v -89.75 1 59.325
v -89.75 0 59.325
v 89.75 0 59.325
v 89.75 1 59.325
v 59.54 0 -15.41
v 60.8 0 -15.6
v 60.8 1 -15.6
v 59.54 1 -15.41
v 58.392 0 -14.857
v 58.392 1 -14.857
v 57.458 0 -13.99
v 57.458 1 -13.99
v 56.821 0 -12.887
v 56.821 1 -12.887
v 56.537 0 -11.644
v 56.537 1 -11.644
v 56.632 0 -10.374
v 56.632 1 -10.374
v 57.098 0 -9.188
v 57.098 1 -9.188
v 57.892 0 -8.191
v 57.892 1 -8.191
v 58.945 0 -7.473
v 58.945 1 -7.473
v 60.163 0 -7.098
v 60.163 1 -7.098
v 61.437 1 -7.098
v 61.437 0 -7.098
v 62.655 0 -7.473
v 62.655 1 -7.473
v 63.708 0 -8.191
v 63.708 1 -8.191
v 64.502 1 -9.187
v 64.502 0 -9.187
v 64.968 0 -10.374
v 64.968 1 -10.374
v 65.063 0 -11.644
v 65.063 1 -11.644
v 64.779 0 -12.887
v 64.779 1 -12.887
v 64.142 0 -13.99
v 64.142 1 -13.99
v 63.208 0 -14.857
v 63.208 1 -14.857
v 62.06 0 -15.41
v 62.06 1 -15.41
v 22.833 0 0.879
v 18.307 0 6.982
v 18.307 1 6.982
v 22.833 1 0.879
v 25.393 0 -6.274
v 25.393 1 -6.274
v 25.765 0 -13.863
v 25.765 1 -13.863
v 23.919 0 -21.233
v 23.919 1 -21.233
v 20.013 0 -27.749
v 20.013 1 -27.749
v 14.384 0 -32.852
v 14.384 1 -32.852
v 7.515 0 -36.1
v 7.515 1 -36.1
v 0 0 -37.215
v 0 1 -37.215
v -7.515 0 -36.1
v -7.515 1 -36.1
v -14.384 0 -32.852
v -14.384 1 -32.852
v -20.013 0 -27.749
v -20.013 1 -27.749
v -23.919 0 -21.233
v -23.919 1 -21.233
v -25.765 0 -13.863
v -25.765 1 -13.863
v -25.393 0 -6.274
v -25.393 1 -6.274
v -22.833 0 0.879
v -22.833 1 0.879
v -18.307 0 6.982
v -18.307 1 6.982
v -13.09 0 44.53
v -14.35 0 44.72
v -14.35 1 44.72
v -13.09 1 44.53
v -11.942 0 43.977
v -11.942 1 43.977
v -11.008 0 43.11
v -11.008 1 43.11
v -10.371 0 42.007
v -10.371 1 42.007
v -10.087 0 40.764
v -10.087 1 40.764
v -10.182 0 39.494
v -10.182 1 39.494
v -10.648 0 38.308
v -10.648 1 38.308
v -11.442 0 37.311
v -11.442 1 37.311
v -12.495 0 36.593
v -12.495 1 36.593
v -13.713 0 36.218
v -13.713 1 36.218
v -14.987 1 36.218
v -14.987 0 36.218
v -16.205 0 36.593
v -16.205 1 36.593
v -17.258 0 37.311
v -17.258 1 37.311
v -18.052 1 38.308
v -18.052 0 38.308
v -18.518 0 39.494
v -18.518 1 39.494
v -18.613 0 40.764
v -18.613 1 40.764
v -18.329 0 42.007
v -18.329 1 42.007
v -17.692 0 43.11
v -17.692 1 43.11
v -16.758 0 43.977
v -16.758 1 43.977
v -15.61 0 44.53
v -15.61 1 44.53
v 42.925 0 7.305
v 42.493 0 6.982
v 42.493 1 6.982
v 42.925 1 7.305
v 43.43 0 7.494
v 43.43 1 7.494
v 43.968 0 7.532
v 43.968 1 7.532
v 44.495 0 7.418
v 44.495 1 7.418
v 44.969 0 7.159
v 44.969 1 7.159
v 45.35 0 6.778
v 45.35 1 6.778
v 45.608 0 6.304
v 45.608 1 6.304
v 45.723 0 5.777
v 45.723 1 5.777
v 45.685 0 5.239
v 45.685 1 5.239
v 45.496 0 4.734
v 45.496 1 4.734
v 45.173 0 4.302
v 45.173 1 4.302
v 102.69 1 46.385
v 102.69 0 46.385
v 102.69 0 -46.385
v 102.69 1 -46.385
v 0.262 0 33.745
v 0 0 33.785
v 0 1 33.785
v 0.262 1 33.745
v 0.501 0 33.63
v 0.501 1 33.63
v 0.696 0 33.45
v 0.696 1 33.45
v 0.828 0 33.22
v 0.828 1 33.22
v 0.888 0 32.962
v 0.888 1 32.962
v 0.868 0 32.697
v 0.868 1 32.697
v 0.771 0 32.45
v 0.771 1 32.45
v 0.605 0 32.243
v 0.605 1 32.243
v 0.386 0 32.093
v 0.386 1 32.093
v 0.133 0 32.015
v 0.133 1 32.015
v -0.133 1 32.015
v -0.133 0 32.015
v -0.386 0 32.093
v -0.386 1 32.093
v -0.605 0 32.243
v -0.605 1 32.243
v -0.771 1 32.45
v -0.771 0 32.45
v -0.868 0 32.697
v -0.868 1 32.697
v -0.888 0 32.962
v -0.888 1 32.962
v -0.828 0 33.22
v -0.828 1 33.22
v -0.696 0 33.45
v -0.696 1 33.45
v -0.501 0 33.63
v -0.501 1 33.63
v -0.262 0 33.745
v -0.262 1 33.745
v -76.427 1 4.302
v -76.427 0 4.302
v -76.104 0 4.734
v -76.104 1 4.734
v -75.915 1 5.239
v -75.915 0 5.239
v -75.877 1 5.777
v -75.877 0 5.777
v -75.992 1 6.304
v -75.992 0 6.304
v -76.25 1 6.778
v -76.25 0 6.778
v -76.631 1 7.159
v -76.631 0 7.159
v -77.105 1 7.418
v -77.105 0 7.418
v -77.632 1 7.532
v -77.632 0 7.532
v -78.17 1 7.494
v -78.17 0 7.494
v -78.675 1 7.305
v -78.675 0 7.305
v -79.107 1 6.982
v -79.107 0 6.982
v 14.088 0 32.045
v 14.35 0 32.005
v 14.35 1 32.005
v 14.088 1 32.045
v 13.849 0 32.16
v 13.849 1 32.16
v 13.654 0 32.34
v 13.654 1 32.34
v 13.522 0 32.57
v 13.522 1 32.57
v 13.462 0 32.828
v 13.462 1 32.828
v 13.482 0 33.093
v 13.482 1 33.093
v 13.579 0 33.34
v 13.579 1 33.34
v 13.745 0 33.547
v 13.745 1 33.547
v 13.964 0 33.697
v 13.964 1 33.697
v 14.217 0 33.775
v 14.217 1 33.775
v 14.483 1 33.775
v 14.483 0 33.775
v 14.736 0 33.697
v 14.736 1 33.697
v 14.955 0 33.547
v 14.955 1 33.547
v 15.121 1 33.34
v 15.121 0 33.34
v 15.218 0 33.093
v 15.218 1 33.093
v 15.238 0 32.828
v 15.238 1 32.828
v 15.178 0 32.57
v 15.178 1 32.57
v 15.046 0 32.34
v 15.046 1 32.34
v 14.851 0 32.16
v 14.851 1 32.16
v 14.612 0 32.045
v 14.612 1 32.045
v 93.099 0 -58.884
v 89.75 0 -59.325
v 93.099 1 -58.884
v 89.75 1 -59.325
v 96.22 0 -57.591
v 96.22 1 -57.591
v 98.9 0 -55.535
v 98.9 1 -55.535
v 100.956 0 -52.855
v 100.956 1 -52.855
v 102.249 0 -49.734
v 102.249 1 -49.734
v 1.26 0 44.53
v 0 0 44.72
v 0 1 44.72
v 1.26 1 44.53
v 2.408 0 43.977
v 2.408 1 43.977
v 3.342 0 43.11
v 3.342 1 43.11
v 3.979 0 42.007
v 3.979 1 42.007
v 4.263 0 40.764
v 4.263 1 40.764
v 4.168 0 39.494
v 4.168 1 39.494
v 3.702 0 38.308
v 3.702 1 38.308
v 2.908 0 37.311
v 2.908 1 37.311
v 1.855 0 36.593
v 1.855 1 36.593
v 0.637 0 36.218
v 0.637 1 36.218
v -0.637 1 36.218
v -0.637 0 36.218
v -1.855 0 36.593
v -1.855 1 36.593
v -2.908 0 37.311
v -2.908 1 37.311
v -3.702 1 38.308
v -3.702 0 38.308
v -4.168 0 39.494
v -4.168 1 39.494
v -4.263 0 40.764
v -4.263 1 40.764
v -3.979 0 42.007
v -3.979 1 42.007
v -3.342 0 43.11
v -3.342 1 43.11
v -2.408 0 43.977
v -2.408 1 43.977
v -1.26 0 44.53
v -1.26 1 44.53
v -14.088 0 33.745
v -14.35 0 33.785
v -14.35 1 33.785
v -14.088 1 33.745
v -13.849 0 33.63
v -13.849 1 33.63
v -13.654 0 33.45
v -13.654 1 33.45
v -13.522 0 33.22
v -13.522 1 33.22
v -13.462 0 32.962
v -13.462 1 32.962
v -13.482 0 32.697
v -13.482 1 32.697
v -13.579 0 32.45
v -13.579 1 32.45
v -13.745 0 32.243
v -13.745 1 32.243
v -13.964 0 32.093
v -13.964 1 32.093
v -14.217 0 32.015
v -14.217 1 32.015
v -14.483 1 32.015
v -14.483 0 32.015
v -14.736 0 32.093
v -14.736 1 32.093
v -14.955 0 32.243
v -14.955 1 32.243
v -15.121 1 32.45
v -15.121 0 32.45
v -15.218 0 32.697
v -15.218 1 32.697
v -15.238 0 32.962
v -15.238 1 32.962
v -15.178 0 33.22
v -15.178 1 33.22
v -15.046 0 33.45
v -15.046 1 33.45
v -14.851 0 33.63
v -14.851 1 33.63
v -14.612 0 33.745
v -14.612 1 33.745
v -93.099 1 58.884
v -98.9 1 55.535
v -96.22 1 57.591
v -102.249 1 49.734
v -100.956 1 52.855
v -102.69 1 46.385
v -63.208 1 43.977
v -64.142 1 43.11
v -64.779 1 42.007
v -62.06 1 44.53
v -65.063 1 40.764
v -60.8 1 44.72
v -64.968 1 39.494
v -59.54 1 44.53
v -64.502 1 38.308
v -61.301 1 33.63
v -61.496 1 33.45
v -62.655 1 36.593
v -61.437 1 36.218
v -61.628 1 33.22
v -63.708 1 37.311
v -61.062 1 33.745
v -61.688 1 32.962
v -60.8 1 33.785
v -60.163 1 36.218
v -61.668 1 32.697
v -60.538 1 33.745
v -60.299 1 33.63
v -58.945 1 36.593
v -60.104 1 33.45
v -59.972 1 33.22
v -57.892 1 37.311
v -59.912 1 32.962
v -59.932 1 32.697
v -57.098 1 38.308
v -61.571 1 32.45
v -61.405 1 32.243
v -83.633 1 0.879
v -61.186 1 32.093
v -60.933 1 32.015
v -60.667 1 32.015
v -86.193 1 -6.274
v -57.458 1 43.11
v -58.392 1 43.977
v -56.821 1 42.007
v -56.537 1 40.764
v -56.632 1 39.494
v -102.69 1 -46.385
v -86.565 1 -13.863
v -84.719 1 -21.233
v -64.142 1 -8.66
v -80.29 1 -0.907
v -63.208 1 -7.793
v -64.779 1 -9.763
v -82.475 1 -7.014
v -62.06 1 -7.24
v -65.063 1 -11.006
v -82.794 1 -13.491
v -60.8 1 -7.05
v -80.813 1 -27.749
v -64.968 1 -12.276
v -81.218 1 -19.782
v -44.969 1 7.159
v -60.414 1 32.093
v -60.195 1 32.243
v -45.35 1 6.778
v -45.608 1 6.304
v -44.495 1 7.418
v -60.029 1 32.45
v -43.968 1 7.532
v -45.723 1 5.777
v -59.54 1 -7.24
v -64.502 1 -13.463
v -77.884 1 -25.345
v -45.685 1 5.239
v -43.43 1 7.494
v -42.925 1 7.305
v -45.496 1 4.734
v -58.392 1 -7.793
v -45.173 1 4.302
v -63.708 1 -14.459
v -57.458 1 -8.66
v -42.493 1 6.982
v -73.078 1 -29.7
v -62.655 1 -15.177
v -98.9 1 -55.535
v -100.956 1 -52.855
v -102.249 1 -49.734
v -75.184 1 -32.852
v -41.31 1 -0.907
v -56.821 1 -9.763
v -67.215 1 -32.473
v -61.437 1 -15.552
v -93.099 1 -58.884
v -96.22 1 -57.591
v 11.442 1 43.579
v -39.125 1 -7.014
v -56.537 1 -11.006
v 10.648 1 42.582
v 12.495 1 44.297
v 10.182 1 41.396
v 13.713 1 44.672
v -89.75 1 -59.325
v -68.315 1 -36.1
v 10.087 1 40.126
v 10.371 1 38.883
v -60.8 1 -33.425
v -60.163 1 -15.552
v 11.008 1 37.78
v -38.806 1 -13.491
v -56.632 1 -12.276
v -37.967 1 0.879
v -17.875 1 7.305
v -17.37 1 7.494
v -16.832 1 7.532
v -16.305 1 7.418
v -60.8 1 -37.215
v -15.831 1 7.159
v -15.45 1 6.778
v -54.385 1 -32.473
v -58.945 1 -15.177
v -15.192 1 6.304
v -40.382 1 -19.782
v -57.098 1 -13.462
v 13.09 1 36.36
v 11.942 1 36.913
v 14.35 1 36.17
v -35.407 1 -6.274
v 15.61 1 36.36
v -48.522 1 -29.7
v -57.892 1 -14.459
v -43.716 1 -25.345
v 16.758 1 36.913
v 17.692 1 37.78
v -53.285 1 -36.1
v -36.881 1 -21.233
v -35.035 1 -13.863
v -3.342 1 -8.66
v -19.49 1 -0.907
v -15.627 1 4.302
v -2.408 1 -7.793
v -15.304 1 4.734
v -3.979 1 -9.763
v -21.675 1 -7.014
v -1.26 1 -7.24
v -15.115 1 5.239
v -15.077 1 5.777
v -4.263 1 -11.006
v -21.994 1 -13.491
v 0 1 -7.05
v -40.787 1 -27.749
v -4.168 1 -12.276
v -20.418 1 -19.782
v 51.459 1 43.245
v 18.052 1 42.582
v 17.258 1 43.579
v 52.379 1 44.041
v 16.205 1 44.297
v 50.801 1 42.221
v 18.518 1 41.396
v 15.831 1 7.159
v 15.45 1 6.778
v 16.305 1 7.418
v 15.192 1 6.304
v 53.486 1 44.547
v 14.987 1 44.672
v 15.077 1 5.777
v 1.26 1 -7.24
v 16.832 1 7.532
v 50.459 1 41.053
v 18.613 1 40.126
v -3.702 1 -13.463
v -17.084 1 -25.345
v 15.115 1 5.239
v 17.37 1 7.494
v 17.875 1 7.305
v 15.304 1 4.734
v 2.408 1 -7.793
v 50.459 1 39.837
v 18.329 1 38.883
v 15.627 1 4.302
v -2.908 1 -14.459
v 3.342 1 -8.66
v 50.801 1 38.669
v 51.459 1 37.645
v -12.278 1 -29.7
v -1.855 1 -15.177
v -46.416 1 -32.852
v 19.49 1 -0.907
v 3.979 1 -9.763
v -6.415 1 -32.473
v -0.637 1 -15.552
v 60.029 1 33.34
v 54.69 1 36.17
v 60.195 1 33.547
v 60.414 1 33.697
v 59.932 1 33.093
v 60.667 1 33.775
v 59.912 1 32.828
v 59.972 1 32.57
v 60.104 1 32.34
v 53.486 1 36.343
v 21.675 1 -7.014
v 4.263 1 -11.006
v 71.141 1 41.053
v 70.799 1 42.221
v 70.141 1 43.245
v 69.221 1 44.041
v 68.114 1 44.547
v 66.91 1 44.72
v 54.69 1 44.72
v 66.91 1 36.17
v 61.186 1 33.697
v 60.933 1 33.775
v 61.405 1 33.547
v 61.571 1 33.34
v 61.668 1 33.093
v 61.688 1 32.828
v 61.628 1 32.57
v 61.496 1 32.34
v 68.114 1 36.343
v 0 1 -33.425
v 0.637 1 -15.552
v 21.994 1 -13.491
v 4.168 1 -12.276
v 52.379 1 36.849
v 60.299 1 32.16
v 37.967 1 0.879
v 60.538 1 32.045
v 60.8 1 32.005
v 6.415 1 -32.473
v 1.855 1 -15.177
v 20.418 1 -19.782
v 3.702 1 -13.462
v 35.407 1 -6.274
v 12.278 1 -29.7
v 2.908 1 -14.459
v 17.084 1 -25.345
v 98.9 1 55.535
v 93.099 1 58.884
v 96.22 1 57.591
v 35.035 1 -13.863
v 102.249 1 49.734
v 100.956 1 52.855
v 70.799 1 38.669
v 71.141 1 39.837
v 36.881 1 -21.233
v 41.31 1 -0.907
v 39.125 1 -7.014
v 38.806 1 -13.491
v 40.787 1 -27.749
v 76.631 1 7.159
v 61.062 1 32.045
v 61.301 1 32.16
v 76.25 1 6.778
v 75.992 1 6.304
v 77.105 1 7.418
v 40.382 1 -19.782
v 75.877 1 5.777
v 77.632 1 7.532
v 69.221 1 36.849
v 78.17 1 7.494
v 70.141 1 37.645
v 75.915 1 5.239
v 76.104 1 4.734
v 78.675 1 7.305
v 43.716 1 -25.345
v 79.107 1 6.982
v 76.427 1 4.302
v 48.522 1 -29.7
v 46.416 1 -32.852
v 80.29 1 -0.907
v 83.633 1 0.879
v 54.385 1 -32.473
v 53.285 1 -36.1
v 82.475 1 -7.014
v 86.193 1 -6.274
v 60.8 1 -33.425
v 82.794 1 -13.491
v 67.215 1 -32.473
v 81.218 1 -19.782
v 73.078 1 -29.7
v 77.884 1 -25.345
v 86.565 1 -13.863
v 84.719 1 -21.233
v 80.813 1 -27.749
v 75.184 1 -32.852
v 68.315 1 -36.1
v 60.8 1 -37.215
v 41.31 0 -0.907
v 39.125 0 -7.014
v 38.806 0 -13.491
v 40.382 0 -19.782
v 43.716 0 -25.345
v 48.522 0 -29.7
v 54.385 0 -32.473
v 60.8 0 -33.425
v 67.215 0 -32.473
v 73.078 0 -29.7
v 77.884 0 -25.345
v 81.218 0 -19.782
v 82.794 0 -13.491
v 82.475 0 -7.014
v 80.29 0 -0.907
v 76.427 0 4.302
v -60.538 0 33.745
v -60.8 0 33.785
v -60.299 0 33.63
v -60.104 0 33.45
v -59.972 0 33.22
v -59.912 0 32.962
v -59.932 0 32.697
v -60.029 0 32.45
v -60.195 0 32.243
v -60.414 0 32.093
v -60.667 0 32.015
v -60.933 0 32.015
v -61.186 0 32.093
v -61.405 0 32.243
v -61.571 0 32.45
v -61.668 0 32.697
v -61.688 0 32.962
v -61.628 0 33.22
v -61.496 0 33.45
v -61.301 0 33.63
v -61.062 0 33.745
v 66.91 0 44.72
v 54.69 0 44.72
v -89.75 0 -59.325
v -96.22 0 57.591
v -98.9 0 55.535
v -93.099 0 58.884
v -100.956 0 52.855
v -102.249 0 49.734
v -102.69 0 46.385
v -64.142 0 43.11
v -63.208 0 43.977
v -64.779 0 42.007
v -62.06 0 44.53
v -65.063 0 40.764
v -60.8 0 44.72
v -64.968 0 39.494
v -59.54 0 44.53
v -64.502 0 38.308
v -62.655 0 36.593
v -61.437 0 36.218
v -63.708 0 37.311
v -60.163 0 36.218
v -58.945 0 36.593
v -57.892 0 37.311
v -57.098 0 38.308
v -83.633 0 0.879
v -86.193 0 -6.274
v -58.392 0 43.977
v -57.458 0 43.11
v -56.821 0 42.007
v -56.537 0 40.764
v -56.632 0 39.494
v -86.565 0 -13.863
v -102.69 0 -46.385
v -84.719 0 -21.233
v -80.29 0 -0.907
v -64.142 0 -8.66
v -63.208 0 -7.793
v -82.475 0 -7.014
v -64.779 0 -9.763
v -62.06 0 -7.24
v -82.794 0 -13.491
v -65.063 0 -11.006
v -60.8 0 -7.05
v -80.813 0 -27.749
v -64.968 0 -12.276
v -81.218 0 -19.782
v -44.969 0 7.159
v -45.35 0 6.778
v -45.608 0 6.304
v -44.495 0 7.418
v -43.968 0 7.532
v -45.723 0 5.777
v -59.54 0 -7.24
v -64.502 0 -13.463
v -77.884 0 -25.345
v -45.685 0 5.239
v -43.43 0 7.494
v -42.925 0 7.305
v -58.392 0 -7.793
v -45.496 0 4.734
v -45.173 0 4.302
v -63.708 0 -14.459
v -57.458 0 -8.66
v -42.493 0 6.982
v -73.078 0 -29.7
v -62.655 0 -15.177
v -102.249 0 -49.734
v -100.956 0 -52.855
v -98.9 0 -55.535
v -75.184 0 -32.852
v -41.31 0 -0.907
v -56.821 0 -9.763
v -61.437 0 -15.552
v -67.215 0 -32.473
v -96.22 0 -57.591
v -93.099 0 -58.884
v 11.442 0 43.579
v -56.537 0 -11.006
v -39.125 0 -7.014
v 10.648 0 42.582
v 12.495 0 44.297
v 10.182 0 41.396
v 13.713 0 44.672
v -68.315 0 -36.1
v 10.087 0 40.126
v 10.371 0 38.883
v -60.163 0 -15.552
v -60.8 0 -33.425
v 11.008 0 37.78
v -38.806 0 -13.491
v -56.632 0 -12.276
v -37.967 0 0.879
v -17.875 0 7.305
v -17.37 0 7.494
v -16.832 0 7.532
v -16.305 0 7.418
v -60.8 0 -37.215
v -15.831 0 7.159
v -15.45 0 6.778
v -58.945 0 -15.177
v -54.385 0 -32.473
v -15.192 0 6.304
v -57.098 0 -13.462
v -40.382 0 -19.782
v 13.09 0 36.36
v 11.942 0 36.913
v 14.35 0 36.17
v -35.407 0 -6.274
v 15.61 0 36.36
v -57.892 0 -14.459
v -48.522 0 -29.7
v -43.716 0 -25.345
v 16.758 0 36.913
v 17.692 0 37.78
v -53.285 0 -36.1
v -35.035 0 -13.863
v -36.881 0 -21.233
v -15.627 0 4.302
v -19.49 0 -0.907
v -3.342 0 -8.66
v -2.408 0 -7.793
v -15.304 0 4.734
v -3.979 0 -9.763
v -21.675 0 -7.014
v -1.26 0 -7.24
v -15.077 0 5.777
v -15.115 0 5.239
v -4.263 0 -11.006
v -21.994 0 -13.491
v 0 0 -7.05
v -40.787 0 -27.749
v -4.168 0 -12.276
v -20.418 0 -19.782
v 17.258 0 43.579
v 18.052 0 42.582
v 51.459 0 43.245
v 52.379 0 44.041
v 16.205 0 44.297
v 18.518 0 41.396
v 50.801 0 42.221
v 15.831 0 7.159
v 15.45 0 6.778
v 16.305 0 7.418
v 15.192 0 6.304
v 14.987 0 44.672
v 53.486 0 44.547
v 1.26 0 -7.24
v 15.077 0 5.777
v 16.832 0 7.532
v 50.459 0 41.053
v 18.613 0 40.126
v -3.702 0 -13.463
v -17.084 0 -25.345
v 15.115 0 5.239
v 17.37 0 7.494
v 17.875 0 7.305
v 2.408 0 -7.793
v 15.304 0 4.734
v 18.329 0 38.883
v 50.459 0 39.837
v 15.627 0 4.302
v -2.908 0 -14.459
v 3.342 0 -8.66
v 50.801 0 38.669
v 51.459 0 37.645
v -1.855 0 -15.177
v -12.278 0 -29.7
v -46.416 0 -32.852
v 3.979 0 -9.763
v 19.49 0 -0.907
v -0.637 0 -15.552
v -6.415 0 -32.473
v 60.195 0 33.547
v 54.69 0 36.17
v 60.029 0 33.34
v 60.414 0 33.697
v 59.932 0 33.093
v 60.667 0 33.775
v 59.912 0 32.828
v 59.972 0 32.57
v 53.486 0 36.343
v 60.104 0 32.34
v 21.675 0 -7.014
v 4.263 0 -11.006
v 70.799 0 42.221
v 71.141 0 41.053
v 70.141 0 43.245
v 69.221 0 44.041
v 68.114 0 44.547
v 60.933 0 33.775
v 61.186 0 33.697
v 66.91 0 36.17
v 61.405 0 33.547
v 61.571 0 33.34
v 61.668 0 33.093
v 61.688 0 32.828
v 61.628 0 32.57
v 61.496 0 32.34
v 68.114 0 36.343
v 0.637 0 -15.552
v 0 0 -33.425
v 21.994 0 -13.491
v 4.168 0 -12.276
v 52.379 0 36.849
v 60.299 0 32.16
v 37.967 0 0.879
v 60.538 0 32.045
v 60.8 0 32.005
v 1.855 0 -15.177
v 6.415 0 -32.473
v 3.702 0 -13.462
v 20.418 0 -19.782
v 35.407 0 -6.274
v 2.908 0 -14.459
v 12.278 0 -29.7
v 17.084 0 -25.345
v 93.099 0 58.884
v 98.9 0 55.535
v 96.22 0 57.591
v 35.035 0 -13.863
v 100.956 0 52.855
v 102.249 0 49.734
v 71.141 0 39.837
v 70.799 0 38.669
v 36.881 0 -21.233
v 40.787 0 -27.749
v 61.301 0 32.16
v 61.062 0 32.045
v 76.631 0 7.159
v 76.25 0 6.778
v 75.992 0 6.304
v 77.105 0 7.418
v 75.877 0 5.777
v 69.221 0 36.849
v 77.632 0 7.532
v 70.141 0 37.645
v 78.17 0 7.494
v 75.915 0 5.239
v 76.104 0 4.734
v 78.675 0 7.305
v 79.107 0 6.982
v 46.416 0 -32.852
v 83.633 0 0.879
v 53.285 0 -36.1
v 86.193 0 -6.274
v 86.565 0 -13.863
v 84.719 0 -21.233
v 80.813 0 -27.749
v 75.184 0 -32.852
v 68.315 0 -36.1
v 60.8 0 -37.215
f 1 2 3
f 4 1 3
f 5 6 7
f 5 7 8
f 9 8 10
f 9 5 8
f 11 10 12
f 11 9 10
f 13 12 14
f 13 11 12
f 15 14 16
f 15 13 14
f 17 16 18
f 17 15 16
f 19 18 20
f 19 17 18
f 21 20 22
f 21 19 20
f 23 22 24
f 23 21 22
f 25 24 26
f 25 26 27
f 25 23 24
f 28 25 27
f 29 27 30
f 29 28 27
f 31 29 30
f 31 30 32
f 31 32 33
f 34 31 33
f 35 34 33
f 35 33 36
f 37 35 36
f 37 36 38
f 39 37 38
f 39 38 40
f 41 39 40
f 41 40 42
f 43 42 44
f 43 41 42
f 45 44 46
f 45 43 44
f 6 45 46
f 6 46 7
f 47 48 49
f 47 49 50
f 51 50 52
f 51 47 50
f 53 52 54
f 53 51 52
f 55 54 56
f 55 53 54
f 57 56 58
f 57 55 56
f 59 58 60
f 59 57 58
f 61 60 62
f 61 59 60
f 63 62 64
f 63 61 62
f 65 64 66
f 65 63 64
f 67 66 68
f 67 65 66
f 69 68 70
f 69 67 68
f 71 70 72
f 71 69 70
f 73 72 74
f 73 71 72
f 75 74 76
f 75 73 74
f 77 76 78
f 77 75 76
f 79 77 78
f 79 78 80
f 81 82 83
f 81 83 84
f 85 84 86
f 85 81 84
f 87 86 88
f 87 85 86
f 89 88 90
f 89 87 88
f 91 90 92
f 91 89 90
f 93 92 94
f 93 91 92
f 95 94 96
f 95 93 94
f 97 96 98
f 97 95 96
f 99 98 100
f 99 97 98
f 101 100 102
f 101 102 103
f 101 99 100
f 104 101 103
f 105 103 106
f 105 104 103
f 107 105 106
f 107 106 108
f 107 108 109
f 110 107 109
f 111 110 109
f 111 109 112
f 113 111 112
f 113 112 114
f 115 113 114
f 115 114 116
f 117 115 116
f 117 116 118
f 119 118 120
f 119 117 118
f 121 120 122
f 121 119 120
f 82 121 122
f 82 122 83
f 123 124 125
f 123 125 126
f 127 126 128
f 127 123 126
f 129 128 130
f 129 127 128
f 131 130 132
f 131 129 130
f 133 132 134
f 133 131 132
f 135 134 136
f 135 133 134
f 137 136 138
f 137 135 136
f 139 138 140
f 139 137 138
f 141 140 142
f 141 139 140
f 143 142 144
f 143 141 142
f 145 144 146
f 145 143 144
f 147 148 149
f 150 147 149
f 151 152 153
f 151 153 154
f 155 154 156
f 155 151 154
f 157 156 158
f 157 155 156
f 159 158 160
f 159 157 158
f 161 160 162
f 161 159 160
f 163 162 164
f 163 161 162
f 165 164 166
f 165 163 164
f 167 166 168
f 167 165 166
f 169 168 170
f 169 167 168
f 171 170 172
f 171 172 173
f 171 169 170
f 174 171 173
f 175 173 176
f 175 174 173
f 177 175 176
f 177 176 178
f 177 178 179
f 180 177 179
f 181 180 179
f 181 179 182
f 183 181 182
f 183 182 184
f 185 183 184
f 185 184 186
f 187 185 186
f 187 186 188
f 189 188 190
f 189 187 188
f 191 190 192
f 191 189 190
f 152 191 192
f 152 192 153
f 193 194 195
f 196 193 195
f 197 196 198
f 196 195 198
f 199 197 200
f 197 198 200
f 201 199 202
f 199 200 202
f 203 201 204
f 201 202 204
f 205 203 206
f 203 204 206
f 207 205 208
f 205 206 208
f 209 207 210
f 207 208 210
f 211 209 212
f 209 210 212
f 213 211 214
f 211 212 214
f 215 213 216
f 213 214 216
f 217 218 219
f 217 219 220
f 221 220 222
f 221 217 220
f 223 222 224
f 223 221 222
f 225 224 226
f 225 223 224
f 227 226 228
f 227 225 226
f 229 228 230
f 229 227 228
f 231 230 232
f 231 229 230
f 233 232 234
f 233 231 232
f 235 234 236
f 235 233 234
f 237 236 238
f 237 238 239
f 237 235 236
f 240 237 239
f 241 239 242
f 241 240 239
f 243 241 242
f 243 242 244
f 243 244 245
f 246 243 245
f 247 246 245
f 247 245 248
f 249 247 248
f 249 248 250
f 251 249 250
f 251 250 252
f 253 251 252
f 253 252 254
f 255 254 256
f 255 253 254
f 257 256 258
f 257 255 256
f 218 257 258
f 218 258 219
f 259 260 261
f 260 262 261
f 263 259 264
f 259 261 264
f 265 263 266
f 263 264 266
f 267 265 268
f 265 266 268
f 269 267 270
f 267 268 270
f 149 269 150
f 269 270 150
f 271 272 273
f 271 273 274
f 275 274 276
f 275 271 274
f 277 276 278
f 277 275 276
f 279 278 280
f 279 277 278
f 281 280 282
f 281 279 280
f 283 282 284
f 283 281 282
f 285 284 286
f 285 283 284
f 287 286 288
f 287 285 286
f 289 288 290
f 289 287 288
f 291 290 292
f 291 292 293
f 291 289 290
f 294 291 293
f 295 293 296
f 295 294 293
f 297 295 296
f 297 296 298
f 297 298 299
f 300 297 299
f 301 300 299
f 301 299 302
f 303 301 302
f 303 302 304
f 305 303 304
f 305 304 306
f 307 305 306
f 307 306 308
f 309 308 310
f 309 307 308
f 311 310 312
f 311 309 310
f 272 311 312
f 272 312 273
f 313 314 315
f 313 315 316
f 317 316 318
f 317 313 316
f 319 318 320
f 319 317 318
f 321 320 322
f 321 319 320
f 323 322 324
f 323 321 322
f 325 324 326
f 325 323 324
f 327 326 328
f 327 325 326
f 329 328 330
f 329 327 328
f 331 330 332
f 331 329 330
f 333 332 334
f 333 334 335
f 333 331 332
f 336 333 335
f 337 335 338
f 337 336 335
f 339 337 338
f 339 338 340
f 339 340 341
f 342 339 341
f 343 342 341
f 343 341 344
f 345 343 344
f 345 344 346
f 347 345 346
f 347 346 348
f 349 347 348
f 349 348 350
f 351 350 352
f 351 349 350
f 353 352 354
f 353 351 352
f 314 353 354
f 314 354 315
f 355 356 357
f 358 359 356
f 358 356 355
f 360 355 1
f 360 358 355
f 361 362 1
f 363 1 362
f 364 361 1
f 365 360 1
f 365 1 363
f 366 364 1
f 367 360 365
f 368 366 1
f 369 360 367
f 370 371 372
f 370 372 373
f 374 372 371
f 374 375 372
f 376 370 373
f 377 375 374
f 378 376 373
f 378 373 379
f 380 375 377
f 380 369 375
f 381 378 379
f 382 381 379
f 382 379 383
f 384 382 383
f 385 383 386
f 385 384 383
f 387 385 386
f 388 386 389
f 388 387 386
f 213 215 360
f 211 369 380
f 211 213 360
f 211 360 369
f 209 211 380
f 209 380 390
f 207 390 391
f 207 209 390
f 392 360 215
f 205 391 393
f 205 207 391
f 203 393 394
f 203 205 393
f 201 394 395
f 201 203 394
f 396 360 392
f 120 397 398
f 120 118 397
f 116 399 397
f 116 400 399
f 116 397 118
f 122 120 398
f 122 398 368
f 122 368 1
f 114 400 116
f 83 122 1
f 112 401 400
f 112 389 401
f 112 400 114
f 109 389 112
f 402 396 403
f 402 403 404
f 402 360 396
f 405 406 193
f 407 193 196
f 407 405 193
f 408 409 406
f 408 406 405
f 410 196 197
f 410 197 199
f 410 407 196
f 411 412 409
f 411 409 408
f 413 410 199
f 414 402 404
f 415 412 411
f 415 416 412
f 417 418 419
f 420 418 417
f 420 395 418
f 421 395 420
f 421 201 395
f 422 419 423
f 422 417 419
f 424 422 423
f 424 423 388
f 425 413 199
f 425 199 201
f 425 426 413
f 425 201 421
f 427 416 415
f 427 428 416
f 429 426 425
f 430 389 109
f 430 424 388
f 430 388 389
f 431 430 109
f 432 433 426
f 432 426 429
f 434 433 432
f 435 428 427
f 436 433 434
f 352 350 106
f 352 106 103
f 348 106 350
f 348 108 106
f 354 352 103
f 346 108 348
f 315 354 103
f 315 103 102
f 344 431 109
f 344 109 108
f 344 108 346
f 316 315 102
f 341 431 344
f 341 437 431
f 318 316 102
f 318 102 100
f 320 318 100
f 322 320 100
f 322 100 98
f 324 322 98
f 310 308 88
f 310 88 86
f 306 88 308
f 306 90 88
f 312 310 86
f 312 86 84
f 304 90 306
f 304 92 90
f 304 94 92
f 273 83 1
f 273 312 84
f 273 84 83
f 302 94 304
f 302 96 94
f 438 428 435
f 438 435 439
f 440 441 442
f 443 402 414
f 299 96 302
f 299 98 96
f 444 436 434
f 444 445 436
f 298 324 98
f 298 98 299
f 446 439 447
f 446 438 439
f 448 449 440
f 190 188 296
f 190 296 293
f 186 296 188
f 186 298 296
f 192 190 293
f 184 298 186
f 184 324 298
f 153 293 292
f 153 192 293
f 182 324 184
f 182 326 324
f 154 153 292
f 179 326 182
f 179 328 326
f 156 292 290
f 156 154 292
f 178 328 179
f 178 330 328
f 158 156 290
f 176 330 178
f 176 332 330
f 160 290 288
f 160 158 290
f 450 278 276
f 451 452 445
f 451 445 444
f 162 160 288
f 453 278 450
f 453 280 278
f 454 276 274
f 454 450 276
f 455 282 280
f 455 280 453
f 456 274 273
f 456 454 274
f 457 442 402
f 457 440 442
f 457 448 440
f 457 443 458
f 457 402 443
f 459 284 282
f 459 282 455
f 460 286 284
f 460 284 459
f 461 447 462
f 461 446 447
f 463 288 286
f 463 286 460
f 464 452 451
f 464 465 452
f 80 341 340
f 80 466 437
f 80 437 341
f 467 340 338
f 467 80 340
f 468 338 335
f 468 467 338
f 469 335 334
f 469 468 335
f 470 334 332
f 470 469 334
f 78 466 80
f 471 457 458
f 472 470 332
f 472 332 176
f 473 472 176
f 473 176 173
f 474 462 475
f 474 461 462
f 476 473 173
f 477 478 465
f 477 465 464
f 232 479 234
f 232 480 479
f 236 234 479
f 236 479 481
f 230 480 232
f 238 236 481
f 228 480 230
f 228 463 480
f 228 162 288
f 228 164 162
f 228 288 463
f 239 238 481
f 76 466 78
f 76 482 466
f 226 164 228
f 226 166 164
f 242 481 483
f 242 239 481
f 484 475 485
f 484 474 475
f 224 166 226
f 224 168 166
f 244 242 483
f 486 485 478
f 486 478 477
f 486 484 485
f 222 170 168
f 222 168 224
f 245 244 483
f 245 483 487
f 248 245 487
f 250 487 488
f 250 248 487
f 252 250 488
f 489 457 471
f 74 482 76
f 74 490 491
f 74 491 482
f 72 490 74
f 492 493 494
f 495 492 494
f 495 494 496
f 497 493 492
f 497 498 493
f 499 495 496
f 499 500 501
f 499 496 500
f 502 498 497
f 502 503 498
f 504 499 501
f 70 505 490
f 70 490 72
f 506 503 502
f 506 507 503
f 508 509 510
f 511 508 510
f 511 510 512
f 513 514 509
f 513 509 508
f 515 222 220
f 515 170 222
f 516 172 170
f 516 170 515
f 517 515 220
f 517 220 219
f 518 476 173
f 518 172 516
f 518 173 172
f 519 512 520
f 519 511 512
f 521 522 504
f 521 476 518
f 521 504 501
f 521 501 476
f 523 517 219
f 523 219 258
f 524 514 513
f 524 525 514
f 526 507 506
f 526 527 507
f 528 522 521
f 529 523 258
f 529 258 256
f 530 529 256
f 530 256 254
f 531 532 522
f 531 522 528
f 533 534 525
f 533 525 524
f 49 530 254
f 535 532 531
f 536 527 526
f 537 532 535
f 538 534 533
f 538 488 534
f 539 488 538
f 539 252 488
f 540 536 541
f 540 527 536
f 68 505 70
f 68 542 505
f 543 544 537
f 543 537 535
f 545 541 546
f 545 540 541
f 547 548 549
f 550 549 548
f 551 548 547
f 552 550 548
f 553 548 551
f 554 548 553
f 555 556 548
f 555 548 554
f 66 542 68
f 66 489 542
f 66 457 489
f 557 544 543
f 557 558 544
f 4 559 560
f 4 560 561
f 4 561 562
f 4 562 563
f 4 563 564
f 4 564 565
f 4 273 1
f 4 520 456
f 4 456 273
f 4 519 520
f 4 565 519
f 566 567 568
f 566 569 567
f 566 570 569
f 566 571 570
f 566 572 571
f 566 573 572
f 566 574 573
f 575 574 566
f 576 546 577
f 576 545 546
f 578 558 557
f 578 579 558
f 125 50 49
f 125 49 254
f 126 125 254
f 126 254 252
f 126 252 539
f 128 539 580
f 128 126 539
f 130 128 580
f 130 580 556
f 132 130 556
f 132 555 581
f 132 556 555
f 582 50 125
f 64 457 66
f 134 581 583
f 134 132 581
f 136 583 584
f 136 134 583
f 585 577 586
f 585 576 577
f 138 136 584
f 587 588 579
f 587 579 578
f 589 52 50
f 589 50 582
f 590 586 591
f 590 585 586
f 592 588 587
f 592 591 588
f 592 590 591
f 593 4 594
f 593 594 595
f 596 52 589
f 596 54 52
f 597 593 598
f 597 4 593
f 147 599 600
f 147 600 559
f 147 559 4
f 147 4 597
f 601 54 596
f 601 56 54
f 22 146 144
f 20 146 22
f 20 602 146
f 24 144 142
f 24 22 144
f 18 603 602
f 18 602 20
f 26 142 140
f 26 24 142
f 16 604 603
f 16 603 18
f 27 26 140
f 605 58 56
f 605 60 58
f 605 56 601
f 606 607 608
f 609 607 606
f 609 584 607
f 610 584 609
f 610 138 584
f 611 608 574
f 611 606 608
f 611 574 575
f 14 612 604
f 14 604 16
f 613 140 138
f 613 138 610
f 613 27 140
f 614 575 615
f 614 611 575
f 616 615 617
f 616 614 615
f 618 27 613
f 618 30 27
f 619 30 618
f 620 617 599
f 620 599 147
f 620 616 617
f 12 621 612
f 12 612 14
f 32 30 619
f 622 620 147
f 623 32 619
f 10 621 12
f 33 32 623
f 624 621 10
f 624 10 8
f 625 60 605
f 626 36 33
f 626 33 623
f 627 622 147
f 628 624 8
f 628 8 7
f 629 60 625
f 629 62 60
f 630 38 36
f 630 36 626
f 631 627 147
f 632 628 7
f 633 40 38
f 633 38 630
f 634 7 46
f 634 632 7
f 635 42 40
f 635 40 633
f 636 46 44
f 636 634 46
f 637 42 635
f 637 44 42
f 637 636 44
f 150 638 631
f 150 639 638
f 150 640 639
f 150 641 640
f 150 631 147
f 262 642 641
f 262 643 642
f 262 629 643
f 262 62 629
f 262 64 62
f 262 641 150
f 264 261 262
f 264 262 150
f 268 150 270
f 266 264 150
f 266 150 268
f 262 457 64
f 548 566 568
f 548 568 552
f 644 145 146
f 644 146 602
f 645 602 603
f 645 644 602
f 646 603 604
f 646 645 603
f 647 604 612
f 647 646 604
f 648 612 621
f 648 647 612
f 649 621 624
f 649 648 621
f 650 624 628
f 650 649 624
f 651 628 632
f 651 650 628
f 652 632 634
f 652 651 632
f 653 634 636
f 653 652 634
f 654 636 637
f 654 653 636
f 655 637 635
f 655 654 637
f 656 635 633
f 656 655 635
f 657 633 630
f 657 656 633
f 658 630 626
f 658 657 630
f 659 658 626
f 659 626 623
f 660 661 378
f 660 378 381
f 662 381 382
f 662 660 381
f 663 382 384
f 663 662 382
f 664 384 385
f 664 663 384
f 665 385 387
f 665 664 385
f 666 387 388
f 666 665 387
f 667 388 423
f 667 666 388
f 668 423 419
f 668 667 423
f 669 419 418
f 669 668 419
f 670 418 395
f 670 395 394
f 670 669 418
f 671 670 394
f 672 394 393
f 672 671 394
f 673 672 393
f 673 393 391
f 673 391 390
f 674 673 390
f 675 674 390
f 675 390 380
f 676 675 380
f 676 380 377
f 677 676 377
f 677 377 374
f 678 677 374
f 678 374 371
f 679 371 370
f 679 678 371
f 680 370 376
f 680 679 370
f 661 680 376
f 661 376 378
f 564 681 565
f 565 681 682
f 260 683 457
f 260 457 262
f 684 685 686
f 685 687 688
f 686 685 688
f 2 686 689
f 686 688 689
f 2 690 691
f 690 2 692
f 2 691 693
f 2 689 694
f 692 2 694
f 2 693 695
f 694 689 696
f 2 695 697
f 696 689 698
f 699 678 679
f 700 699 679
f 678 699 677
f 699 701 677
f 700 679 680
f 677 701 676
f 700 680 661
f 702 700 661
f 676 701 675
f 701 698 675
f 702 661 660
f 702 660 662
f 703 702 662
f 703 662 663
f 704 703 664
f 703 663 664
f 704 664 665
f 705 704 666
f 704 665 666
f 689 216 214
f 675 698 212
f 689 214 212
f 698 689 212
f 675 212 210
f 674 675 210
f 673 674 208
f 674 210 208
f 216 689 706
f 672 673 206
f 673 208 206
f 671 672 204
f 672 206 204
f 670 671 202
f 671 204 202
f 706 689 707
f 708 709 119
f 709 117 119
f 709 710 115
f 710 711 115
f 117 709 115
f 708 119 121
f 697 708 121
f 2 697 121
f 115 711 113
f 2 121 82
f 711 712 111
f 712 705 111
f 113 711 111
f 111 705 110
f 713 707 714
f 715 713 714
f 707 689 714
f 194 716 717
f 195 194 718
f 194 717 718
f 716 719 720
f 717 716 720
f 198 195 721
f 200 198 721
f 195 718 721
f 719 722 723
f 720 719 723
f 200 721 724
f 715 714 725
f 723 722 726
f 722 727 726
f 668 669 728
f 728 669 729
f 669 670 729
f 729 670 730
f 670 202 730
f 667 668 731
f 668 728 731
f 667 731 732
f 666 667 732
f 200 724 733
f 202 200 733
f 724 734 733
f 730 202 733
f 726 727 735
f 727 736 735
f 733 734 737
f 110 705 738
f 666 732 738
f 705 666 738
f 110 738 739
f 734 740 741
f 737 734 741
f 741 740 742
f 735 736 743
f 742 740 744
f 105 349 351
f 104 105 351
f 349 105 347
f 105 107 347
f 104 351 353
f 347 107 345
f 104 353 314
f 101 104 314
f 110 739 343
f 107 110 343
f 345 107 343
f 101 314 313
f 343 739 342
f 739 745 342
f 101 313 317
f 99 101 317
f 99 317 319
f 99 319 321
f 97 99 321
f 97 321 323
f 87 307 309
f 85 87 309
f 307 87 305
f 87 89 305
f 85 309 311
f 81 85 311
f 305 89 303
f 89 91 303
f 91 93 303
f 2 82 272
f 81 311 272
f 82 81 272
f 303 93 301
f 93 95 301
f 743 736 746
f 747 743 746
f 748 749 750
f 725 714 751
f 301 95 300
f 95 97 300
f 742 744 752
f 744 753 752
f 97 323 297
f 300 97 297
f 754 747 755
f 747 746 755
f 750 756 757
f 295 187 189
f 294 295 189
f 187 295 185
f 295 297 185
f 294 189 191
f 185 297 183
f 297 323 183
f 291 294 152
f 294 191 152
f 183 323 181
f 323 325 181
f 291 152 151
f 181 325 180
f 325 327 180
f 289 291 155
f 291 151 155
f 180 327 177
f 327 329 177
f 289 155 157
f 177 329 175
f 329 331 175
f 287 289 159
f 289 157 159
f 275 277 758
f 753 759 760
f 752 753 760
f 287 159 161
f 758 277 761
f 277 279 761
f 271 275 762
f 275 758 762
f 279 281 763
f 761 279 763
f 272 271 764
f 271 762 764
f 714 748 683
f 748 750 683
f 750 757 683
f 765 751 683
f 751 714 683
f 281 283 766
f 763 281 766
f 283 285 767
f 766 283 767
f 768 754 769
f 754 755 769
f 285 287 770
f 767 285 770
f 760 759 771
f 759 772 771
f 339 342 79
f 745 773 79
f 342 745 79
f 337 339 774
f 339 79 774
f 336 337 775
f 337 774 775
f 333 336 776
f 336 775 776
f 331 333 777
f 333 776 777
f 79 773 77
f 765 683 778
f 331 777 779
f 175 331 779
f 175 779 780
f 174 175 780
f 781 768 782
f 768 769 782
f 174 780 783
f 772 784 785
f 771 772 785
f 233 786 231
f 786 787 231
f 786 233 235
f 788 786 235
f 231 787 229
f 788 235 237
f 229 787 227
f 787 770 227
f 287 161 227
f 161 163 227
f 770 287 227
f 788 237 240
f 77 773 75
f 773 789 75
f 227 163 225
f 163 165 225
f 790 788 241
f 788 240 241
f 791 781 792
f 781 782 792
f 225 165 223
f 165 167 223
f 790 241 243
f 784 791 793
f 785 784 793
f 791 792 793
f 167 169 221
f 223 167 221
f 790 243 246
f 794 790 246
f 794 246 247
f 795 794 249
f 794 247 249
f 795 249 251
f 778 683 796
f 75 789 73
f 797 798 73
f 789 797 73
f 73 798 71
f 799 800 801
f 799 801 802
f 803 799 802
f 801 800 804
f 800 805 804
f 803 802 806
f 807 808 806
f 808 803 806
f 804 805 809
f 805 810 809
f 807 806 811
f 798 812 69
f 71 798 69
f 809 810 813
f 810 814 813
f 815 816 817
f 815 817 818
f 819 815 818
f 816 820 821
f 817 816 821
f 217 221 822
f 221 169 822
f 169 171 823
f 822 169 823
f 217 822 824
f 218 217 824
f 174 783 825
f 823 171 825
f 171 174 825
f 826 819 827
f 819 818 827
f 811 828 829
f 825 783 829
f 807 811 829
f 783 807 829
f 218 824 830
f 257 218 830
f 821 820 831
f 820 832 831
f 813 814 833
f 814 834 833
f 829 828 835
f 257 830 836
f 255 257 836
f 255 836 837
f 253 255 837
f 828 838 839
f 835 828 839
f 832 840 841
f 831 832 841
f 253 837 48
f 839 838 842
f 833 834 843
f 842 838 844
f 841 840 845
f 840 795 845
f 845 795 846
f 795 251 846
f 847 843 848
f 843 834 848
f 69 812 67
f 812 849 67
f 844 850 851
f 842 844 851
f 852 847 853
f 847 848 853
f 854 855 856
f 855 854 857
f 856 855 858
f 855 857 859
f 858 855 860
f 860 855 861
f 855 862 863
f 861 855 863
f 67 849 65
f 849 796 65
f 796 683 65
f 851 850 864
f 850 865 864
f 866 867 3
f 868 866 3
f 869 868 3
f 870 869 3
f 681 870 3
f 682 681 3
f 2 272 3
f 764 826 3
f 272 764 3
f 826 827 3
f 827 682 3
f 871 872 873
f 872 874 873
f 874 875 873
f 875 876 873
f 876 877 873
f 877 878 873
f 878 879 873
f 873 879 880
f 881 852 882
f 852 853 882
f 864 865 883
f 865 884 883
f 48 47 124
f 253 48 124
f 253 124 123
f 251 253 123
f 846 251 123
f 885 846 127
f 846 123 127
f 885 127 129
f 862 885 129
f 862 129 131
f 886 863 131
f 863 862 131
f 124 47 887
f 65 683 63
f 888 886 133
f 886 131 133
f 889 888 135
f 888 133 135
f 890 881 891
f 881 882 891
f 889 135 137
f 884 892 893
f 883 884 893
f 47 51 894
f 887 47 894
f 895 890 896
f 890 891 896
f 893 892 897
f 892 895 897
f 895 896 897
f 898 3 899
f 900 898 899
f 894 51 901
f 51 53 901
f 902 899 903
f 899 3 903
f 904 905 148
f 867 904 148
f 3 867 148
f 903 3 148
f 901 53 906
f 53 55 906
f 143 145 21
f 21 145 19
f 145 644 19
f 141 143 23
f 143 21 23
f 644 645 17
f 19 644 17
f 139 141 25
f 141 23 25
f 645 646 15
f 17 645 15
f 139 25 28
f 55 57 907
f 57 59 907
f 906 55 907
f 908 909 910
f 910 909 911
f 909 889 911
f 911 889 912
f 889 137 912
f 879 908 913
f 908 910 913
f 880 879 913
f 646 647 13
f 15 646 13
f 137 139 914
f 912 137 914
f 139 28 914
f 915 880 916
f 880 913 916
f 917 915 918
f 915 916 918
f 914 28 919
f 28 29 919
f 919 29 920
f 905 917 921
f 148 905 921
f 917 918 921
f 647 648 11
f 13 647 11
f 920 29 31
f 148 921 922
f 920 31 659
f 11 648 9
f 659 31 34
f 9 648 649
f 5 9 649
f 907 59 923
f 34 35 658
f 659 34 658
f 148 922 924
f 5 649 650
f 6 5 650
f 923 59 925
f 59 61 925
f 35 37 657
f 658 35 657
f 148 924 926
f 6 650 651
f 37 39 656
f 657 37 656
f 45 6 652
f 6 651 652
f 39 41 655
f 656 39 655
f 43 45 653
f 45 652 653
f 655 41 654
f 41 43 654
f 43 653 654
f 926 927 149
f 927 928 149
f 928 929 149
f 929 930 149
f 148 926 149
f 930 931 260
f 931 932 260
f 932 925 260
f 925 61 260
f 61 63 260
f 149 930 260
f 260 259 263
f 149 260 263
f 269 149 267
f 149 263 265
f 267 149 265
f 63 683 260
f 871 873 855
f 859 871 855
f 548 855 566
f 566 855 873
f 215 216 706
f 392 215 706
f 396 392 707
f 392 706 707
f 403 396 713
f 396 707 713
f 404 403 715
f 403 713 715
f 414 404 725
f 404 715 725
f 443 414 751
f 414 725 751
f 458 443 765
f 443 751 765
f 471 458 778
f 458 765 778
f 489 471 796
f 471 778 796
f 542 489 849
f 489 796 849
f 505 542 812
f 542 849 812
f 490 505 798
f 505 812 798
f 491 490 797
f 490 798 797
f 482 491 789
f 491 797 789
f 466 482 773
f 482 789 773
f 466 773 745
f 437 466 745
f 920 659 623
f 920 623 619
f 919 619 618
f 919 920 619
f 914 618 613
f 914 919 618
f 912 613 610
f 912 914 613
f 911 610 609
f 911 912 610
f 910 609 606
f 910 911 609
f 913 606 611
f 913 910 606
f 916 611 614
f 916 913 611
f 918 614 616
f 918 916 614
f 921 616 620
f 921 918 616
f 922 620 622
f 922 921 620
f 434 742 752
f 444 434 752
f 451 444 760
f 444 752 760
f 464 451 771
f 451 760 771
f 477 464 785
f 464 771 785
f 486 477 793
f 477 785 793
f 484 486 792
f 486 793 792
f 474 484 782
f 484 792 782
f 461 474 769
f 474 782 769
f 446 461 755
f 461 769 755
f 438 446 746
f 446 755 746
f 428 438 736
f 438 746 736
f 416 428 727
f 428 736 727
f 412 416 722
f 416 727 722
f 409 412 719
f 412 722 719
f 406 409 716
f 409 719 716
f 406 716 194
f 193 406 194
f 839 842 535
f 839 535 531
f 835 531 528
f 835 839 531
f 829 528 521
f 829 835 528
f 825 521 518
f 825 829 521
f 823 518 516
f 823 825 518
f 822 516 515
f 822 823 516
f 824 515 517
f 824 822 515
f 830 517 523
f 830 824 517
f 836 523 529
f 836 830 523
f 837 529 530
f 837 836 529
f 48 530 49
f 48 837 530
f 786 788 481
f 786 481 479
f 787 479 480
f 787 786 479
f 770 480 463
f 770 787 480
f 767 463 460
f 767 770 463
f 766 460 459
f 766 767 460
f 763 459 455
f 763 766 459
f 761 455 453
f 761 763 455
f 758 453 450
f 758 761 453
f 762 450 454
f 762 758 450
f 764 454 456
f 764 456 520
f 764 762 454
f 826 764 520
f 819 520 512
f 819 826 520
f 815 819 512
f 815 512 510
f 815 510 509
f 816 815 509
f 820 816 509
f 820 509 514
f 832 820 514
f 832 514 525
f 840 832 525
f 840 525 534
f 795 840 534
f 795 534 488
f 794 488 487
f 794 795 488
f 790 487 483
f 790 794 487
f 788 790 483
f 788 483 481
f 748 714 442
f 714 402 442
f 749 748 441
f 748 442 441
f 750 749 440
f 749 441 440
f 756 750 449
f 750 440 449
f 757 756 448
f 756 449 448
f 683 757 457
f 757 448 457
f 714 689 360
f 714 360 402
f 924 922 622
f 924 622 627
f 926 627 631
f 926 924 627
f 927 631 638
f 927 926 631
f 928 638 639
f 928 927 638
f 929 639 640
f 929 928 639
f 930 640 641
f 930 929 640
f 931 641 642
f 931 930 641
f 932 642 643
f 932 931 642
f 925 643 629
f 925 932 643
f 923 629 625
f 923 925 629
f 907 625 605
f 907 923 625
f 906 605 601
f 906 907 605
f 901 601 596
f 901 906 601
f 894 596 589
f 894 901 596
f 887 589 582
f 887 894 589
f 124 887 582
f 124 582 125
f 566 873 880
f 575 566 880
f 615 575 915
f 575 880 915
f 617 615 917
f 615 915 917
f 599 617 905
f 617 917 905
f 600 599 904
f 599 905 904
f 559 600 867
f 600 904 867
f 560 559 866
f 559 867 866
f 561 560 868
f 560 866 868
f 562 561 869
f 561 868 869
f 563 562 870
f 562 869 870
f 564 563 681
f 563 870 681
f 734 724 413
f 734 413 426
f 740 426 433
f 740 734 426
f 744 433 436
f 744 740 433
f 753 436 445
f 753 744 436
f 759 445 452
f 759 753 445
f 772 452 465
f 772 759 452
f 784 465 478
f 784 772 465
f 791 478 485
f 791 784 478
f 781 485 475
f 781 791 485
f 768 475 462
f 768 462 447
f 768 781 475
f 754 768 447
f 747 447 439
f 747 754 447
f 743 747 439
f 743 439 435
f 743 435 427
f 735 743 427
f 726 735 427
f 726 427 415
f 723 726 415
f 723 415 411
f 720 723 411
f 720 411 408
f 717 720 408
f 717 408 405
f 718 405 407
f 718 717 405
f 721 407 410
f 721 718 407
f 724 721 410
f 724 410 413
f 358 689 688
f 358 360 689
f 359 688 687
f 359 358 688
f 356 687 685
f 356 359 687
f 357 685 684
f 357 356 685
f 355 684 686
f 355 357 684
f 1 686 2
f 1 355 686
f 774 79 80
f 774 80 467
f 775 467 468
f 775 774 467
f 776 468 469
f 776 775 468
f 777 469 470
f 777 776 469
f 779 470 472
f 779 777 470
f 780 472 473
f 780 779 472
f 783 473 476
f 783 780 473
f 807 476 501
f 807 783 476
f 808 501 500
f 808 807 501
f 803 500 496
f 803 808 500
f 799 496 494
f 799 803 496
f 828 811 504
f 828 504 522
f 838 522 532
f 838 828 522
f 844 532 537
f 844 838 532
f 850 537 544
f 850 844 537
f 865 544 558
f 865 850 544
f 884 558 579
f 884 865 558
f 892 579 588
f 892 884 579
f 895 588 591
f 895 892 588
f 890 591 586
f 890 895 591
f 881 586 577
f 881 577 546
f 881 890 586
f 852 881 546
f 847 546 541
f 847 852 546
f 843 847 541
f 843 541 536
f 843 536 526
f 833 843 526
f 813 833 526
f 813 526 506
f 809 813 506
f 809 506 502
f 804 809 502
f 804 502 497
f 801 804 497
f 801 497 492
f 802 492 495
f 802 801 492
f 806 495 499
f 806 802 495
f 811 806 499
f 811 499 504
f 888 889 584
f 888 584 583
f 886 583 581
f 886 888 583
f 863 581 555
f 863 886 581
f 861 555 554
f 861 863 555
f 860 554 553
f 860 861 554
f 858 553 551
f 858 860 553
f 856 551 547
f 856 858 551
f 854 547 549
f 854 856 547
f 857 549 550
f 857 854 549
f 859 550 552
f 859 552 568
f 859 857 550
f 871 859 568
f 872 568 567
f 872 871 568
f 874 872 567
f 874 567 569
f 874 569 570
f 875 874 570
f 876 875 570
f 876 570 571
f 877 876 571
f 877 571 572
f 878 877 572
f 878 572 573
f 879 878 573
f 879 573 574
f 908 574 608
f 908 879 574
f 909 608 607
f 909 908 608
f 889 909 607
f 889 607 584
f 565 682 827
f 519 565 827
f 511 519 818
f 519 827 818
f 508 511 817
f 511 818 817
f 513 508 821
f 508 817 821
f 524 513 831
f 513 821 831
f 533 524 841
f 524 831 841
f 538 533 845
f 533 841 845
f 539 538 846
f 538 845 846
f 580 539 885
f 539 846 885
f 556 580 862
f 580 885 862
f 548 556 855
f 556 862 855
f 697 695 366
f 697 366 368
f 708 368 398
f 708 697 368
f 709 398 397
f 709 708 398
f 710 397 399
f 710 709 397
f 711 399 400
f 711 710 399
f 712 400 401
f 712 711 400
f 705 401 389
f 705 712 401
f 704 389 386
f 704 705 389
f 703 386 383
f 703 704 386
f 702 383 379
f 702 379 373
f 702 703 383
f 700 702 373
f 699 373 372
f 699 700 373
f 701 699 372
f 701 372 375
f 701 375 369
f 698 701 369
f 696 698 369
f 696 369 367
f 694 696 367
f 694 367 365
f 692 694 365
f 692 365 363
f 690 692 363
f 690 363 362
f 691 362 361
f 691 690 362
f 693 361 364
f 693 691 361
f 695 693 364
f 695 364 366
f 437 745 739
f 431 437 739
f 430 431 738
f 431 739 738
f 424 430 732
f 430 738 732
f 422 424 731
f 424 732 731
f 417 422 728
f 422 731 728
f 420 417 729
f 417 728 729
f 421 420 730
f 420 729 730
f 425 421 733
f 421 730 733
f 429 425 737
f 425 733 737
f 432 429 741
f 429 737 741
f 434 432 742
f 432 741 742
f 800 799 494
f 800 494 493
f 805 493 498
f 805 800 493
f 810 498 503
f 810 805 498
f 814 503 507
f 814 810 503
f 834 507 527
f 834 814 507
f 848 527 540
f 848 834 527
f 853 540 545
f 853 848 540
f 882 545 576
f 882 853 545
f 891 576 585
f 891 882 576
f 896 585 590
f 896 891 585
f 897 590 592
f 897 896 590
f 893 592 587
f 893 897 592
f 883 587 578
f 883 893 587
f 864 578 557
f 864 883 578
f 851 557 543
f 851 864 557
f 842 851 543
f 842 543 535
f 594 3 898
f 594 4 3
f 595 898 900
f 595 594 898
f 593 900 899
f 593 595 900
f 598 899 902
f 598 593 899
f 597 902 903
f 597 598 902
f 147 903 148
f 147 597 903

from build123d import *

# Parameters (mm, degrees)
SKETCH1_W           = 205.38
SKETCH1_H           = 118.65
SKETCH1_R           = 4.275
SKETCH1_R_2         = 0.89
BOSS_EXTRUDE1_DEPTH = 1
FILLET1_R           = 12.94


with BuildPart() as part:
    # Sketch1 → Boss-Extrude1 (new body)
    with BuildSketch(Plane(origin=(0, 0, 0), x_dir=(1, 0, 0), z_dir=(0, 1, 0))):
        Rectangle(SKETCH1_W, SKETCH1_H)
        with Locations(Location((0, -40.445, 0), (0, 0, 270))):
            Circle(SKETCH1_R, mode=Mode.SUBTRACT)
        with Locations(Location((-14.35, -40.445, 0), (0, 0, 270))):
            Circle(SKETCH1_R, mode=Mode.SUBTRACT)
        with Locations(Location((0, -32.895, 0), (0, 0, 270))):
            Circle(SKETCH1_R_2, mode=Mode.SUBTRACT)
        with Locations(Location((-14.35, -32.895, 0), (0, 0, 270))):
            Circle(SKETCH1_R_2, mode=Mode.SUBTRACT)
        with Locations(Location((0, 11.325, 0), (0, 0, 270))):
            Circle(SKETCH1_R, mode=Mode.SUBTRACT)
        with Locations(Location((-60.8, 11.325, 0), (0, 0, 270))):
            Circle(SKETCH1_R, mode=Mode.SUBTRACT)
        with Locations(Location((-60.8, -32.895, 0), (0, 0, 270))):
            Circle(SKETCH1_R_2, mode=Mode.SUBTRACT)
        with Locations(Location((14.35, -32.895, 0), (0, 0, 90))):
            Circle(SKETCH1_R_2, mode=Mode.SUBTRACT)
        with Locations(Location((14.35, -40.445, 0), (0, 0, 90))):
            Circle(SKETCH1_R, mode=Mode.SUBTRACT)
        with Locations(Location((60.8, -32.895, 0), (0, 0, 90))):
            Circle(SKETCH1_R_2, mode=Mode.SUBTRACT)
        with Locations(Location((60.8, 11.325, 0), (0, 0, 90))):
            Circle(SKETCH1_R, mode=Mode.SUBTRACT)
        with Locations(Location((-60.8, -40.445, 0), (0, 0, 270))):
            Circle(SKETCH1_R, mode=Mode.SUBTRACT)
        with BuildLine():
            Line((54.69, -36.17), (66.91, -36.17))
            ThreePointArc((66.91, -36.17), (71.185, -40.445), (66.91, -44.72))
            Line((66.91, -44.72), (54.69, -44.72))
            ThreePointArc((54.69, -44.72), (50.415, -40.445), (54.69, -36.17))
        make_face(mode=Mode.SUBTRACT)
        with BuildLine():
            ThreePointArc((18.306994565, -6.981994565), (0, 37.215), (-18.306994565, -6.981994565))
            ThreePointArc((-18.306994565, -6.981994565), (-15.627059864, -6.981994565), (-15.627059864, -4.302059864))
            ThreePointArc((-15.627059864, -4.302059864), (0, 33.425), (15.627059864, -4.302059864))
            ThreePointArc((15.627059864, -4.302059864), (15.627059864, -6.981994565), (18.306994565, -6.981994565))
        make_face(mode=Mode.SUBTRACT)
        with BuildLine():
            ThreePointArc((-42.493005435, -6.981994565), (-45.172940136, -6.981994565), (-45.172940136, -4.302059864))
            ThreePointArc((-45.172940136, -4.302059864), (-60.8, 33.425), (-76.427059864, -4.302059864))
            ThreePointArc((-76.427059864, -4.302059864), (-76.427059864, -6.981994565), (-79.106994565, -6.981994565))
            ThreePointArc((-79.106994565, -6.981994565), (-60.8, 37.215), (-42.493005435, -6.981994565))
        make_face(mode=Mode.SUBTRACT)
        with BuildLine():
            ThreePointArc((42.493005435, -6.981994565), (45.172940136, -6.981994565), (45.172940136, -4.302059864))
            ThreePointArc((45.172940136, -4.302059864), (60.8, 33.425), (76.427059864, -4.302059864))
            ThreePointArc((76.427059864, -4.302059864), (76.427059864, -6.981994565), (79.106994565, -6.981994565))
            ThreePointArc((79.106994565, -6.981994565), (60.8, 37.215), (42.493005435, -6.981994565))
        make_face(mode=Mode.SUBTRACT)
    extrude(amount=BOSS_EXTRUDE1_DEPTH)

    # Fillet1
    fillet1_edges = [part.edges().sort_by_distance(p)[0] for p in [
        (102.69, 0.5, 59.325),
        (-102.69, 0.5, 59.325),
        (-102.69, 0.5, -59.325),
        (102.69, 0.5, -59.325),
    ]]
    fillet(fillet1_edges, radius=FILLET1_R)


solid = part.part
